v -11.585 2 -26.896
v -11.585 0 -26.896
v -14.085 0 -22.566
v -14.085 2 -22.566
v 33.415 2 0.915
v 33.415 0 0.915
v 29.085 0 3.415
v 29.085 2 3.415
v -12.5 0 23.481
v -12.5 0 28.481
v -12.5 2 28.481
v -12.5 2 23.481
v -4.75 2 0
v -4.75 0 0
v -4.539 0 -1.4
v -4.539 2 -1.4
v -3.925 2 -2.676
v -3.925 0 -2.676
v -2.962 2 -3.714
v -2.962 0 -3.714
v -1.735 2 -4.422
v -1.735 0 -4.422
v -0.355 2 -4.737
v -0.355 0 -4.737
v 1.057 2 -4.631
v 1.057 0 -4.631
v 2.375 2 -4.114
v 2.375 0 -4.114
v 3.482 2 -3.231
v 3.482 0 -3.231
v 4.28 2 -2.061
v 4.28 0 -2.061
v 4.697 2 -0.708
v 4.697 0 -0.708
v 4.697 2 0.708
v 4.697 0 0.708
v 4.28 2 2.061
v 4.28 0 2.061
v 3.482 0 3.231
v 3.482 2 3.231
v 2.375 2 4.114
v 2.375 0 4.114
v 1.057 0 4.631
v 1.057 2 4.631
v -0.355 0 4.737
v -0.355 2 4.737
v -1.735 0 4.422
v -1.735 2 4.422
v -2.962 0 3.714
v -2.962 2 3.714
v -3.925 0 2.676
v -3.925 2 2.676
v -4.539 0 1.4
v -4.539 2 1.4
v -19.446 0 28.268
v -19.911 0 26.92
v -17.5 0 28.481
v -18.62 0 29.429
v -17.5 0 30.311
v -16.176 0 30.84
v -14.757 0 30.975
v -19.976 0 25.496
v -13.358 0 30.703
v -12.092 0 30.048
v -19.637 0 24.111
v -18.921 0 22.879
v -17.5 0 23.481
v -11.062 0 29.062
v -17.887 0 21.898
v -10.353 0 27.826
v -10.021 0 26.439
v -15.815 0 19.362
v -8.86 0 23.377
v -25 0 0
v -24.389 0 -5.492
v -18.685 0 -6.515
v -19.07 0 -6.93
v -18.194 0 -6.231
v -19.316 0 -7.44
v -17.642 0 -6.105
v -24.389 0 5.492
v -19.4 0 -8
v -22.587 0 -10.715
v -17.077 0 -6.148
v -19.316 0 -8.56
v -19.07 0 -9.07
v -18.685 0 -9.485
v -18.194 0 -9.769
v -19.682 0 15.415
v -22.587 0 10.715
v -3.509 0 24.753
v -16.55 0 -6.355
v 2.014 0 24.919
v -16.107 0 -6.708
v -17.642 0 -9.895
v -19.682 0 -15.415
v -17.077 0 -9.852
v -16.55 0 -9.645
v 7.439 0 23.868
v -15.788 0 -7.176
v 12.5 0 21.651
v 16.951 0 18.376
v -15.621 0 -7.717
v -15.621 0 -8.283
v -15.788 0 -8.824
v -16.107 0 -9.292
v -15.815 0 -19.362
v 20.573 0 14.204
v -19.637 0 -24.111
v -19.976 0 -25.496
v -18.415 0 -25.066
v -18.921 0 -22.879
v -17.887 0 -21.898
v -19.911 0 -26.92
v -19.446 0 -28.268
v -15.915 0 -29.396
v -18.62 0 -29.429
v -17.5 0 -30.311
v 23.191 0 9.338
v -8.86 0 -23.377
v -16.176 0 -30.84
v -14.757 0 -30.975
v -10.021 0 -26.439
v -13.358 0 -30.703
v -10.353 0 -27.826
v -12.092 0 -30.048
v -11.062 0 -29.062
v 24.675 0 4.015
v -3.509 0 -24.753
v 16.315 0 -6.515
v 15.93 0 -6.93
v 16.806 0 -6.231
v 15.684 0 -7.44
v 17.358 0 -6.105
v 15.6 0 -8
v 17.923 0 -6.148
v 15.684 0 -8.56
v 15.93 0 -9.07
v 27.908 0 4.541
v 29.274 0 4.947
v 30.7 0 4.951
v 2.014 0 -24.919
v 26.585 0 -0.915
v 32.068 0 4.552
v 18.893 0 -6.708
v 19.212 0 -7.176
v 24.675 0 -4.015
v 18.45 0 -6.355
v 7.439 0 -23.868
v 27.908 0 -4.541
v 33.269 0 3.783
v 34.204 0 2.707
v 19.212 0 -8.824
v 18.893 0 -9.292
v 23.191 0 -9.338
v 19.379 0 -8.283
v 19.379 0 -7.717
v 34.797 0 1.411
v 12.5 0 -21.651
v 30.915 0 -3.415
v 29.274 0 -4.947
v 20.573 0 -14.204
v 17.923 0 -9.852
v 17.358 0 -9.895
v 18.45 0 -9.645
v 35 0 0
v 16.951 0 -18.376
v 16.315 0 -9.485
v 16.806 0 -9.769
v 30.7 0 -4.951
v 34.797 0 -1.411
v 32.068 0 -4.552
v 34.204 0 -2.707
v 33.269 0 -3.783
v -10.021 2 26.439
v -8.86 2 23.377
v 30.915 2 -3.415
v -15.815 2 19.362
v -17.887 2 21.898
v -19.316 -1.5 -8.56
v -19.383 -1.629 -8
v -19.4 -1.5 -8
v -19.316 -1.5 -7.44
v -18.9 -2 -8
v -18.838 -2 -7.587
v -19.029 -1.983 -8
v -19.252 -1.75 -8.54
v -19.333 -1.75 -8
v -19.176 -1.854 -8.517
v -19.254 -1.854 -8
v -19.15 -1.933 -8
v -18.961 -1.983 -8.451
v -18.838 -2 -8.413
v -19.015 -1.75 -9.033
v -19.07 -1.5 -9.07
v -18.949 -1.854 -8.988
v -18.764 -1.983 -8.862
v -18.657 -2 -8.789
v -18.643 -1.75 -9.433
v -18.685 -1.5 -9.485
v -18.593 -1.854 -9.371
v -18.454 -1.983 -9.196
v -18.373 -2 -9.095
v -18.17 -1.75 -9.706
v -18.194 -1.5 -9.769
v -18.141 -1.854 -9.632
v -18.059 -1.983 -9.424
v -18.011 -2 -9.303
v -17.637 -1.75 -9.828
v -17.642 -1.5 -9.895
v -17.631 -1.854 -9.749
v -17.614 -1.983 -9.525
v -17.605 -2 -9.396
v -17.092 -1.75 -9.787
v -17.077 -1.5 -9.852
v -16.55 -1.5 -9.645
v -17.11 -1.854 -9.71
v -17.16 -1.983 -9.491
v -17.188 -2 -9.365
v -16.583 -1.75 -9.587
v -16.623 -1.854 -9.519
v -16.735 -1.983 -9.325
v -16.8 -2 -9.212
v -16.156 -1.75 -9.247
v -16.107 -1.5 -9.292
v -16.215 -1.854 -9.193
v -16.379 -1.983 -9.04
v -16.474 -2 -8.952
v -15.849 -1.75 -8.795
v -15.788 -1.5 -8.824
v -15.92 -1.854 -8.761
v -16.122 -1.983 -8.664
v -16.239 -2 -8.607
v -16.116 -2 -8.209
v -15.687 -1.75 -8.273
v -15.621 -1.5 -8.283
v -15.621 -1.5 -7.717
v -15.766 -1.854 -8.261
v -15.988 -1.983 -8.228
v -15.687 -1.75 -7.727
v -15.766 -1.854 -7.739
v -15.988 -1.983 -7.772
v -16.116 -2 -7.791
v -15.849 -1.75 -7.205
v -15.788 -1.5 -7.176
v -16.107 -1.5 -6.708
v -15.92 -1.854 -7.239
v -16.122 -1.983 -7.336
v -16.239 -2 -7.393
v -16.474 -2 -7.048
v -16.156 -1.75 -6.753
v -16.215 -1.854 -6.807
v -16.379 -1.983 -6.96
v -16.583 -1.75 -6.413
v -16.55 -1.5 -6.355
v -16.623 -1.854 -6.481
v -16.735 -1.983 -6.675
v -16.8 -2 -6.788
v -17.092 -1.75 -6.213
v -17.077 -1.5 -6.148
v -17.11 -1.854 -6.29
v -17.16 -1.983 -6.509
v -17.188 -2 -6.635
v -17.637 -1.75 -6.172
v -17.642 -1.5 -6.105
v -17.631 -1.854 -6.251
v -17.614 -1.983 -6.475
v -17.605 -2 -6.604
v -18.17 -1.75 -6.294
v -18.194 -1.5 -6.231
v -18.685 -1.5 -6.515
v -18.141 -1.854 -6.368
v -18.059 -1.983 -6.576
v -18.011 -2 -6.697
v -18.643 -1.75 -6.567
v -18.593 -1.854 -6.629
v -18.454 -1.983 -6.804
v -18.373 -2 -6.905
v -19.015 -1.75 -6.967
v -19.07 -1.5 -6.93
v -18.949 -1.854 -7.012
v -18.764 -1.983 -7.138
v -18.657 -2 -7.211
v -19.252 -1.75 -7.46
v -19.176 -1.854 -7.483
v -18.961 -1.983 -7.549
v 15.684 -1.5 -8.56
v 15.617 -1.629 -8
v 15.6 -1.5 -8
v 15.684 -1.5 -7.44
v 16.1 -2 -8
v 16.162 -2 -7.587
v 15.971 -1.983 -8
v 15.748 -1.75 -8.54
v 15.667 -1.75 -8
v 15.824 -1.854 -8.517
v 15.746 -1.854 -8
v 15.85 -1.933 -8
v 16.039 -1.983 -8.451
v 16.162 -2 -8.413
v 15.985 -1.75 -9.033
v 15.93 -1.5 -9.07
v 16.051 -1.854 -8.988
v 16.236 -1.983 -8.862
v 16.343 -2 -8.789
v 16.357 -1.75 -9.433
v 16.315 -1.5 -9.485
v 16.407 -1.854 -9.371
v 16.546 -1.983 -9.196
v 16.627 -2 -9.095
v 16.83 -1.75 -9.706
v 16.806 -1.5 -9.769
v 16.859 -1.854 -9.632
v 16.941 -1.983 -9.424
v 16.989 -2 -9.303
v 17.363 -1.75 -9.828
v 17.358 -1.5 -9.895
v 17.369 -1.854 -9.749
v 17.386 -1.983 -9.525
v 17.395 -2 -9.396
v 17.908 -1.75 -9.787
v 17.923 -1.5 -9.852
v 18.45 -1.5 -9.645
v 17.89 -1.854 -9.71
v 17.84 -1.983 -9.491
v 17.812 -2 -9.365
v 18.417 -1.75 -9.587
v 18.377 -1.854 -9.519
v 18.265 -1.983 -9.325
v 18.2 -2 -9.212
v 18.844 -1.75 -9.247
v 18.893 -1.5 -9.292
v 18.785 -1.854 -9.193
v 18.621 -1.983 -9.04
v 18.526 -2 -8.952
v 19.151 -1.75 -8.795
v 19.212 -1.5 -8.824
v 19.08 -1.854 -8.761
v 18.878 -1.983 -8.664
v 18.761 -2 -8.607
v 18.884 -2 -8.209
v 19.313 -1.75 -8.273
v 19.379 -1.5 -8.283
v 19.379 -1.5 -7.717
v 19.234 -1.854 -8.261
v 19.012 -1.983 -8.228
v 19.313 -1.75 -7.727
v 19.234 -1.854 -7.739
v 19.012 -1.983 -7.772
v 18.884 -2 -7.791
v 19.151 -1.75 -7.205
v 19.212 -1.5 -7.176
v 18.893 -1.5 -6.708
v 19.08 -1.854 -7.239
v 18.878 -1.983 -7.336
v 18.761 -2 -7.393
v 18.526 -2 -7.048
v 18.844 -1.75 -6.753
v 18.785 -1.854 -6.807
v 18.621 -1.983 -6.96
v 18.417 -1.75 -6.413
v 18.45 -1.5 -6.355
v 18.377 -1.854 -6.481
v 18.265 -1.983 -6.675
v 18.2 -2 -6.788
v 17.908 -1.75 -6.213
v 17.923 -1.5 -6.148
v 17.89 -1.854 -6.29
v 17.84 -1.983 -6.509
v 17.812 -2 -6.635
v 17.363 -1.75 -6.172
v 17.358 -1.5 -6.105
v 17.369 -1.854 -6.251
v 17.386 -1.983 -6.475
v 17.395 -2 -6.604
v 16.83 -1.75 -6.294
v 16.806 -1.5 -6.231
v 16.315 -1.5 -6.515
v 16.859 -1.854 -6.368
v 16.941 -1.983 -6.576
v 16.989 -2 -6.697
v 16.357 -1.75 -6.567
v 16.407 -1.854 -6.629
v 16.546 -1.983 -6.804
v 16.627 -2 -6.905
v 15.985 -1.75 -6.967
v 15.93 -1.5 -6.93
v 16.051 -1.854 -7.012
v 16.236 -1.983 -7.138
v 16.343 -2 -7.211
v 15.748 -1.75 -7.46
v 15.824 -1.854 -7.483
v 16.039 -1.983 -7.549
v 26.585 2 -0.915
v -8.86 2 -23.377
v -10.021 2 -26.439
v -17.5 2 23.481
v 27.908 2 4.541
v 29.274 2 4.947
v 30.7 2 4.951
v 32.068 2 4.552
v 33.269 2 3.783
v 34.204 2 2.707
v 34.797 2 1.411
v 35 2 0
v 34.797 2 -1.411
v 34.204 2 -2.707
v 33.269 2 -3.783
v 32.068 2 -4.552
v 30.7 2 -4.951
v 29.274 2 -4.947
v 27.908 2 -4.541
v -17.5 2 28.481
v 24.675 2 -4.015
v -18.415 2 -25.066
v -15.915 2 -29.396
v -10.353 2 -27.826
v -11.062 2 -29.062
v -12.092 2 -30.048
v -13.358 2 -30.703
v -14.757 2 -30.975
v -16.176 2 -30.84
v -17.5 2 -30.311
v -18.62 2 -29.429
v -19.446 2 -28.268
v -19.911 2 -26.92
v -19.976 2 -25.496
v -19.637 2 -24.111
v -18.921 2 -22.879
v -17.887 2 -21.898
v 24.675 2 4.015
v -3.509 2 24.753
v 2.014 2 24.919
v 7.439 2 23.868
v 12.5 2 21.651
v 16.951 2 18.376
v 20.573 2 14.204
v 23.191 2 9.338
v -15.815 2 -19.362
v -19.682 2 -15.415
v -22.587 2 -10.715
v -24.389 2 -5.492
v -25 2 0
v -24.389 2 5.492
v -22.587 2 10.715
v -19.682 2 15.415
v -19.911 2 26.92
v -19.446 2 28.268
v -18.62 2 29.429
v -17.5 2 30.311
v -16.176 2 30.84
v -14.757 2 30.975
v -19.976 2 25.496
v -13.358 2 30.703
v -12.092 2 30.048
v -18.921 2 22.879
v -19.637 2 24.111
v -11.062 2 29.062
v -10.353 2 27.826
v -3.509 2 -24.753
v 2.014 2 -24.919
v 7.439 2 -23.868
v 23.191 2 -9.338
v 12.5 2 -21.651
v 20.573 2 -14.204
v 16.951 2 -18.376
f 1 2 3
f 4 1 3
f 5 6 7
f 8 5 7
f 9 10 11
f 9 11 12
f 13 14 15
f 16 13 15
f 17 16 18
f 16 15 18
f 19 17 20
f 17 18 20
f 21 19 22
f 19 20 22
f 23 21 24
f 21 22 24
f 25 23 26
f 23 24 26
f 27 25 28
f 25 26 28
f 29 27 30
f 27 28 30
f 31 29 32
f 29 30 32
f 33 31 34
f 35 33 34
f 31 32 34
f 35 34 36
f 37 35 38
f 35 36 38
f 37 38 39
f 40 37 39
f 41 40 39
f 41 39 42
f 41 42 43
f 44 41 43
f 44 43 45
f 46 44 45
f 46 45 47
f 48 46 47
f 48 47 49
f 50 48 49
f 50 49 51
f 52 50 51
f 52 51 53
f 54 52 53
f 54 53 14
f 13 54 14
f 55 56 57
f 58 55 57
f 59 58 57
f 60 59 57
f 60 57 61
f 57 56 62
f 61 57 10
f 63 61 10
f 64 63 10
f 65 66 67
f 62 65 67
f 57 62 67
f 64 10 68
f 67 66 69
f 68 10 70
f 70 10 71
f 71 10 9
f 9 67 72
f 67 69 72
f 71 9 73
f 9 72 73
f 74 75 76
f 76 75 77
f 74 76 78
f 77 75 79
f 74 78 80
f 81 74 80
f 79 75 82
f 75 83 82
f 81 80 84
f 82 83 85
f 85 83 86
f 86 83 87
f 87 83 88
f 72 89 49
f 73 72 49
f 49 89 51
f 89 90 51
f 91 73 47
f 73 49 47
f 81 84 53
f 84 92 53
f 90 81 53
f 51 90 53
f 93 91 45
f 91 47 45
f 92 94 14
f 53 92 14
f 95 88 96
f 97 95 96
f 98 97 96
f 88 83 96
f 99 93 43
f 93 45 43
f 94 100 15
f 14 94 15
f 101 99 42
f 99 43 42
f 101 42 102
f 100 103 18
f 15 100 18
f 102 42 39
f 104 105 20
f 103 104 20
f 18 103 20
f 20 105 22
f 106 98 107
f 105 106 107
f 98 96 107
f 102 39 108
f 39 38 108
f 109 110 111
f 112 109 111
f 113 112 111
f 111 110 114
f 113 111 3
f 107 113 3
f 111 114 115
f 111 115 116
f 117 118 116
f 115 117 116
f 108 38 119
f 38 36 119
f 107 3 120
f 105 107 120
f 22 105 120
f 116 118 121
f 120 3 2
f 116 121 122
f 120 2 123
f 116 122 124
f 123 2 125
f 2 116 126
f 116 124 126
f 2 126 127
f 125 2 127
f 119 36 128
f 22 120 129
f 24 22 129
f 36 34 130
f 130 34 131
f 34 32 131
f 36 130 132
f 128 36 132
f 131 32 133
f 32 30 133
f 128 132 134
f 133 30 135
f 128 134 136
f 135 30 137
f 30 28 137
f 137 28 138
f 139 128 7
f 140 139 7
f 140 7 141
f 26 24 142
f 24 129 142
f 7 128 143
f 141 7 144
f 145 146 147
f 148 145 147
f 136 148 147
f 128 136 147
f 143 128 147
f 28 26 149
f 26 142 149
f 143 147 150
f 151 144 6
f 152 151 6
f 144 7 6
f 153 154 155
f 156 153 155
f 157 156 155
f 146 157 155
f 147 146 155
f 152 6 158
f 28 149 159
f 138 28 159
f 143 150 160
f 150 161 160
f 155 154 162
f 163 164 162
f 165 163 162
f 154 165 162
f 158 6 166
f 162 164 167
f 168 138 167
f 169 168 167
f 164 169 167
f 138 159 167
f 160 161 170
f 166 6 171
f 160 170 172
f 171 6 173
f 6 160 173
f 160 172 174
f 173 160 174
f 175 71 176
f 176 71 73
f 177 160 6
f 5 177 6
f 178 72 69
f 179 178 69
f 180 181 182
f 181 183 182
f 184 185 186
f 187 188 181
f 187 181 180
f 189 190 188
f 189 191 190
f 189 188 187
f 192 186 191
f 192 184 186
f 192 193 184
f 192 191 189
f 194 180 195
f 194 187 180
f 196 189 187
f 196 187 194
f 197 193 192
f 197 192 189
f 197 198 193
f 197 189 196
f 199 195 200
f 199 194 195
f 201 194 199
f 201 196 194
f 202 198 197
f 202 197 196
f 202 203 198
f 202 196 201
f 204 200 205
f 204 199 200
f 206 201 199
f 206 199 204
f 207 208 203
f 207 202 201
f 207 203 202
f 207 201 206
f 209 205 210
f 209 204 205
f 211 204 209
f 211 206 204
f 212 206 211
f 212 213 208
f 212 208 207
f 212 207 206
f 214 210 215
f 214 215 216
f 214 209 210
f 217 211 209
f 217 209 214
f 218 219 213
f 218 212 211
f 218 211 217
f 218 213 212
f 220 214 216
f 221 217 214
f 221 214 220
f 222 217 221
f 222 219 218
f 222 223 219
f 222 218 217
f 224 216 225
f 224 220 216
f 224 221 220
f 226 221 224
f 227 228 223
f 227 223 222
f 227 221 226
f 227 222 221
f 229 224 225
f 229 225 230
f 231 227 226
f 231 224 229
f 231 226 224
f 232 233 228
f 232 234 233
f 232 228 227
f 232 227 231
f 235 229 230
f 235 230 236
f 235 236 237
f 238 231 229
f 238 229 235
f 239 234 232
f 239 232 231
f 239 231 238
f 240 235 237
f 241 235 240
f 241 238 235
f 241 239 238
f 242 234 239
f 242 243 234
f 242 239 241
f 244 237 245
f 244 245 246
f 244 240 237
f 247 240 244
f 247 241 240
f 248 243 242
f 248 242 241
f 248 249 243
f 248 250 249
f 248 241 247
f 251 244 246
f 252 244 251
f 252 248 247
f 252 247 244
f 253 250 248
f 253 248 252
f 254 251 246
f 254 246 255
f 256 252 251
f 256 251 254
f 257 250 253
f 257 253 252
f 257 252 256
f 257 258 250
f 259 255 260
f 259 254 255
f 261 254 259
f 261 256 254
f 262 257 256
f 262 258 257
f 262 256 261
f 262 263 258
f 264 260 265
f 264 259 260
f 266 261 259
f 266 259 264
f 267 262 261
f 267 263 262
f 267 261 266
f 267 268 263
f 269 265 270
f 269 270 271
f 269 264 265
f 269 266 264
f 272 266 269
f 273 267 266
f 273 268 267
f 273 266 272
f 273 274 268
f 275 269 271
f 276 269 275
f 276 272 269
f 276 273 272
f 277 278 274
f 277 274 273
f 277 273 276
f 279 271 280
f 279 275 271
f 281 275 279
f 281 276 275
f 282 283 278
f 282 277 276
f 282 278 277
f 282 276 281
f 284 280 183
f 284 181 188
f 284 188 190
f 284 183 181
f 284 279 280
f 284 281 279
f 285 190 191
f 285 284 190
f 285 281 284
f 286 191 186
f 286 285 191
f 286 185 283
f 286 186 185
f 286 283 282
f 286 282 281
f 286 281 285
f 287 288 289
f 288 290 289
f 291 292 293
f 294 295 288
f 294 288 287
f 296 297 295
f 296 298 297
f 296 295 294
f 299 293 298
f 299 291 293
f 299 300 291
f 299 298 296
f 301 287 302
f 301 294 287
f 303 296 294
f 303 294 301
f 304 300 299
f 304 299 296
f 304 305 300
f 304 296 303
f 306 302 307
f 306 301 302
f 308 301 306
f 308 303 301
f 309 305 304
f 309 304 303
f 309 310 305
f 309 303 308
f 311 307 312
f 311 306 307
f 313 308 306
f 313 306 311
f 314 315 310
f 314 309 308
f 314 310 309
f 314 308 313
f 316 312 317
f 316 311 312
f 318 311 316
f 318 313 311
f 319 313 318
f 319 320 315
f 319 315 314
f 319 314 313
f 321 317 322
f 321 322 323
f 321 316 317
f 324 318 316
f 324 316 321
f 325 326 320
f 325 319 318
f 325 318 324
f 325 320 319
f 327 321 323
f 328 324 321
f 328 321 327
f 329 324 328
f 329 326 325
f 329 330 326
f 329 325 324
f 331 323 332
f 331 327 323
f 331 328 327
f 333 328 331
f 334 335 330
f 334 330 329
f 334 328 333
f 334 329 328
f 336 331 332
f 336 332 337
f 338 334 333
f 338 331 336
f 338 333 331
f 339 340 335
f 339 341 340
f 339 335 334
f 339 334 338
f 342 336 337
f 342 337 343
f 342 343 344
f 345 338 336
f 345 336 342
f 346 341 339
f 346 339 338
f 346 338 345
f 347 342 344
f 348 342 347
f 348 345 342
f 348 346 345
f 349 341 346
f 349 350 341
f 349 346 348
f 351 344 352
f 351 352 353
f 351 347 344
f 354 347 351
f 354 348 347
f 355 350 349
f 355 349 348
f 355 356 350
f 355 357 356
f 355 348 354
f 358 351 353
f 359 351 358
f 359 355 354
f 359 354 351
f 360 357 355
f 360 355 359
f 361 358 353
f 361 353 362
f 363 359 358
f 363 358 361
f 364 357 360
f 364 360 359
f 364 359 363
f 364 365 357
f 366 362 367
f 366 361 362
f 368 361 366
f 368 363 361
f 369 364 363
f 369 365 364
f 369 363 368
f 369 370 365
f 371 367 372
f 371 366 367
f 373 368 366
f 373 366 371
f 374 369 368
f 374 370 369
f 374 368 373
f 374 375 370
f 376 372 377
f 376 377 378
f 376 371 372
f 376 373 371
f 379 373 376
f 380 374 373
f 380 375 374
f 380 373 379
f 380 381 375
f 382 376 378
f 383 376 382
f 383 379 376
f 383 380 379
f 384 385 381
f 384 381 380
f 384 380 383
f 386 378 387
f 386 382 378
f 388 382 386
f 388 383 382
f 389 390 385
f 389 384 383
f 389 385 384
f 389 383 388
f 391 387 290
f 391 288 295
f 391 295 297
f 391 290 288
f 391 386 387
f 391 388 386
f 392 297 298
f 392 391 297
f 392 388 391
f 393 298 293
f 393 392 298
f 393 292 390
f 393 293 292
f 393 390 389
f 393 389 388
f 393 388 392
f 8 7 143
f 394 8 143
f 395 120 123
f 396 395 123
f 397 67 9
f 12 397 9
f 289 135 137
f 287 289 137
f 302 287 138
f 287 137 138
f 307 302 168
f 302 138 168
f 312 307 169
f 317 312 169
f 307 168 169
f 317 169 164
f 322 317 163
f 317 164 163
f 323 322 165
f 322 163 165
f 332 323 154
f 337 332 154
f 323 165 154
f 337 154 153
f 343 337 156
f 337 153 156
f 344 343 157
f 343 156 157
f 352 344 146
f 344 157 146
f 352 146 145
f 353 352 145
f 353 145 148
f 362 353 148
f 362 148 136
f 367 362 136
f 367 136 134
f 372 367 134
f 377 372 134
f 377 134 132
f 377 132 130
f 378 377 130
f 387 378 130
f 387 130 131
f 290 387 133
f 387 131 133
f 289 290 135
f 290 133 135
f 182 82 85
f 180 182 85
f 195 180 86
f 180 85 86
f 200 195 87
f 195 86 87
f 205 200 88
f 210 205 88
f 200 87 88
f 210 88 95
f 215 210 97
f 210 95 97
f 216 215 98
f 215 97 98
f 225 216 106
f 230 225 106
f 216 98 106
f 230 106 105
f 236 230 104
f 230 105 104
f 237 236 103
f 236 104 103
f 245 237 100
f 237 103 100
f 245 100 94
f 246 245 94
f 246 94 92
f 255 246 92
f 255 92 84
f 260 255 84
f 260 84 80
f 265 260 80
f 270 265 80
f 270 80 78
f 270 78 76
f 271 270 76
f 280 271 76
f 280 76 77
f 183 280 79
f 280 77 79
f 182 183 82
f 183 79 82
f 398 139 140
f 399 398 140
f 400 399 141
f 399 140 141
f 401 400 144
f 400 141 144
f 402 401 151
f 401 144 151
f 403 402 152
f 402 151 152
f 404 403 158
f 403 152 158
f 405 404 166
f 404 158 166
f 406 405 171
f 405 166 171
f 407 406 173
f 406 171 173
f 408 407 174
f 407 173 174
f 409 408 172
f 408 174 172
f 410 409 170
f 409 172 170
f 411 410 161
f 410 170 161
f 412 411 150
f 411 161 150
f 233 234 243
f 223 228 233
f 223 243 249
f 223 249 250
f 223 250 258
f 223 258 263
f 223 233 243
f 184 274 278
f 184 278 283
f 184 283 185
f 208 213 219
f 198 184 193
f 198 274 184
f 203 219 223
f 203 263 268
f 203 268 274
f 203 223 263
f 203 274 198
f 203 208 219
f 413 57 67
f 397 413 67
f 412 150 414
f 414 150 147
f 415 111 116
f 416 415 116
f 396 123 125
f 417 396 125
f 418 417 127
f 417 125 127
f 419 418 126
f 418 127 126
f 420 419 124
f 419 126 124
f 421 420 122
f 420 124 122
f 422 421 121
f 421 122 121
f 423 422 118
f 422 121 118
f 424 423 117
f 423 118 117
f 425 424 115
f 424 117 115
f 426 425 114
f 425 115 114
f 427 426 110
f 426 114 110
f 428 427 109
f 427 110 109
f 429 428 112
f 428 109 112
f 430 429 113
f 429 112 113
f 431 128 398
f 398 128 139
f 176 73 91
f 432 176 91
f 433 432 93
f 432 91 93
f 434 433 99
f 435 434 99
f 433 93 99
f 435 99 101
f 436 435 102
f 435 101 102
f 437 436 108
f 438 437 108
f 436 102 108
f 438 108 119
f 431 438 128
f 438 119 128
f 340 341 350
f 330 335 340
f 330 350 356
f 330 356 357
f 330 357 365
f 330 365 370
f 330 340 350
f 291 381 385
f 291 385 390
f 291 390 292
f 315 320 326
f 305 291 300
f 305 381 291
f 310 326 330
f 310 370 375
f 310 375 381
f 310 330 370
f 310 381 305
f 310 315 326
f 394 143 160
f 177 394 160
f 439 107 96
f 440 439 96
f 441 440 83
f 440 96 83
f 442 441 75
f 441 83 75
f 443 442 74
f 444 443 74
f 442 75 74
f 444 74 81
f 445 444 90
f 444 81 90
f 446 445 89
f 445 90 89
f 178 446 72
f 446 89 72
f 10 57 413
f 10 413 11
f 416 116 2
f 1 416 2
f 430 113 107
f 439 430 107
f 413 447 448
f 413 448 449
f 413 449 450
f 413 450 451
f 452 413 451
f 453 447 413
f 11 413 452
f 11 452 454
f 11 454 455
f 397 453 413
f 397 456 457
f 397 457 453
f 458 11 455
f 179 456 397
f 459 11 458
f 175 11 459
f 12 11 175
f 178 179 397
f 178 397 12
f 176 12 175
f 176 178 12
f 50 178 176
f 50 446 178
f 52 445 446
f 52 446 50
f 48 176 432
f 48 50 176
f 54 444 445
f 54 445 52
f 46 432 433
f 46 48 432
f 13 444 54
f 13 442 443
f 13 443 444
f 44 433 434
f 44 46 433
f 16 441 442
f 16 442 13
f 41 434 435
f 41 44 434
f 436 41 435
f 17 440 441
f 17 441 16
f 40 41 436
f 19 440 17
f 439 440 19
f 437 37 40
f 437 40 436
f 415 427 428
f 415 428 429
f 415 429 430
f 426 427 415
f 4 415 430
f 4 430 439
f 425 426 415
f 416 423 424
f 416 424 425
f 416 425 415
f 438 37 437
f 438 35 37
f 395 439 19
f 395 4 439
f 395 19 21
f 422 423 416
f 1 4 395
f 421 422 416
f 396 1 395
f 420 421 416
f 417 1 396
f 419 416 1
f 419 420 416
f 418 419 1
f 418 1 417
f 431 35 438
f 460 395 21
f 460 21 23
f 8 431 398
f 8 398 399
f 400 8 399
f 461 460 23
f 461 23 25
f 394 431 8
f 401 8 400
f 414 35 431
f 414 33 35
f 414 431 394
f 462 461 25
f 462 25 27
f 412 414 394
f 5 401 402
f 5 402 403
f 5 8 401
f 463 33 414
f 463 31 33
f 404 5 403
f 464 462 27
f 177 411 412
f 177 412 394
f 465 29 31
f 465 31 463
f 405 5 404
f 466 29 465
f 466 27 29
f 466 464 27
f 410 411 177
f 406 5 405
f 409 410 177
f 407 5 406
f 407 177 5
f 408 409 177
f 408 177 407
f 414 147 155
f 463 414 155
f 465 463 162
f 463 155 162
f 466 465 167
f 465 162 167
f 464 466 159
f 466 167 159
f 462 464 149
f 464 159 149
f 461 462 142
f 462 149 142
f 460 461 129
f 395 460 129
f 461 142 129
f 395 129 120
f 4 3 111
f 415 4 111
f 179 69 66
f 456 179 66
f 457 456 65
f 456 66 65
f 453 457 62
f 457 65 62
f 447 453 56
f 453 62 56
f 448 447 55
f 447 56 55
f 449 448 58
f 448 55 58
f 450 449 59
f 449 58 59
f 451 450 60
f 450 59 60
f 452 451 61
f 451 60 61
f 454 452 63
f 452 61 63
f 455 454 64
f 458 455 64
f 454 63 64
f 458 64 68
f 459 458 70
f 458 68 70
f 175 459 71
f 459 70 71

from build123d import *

# Parameters (mm, degrees)
SKETCH1_W           = 5
SKETCH1_H           = 5
BOSS_EXTRUDE1_DEPTH = 2
CUT_EXTRUDE1_REACH  = 48.785
SKETCH2_R           = 4.75
SKETCH3_R           = 1.9
BOSS_EXTRUDE2_DEPTH = 2
FILLET1_R           = 0.5


with BuildPart() as part:
    # Sketch1 → Boss-Extrude1 (new body)
    with BuildSketch(Plane(origin=(0, 0, 0), x_dir=(1, 0, 0), z_dir=(0, 1, 0))):
        with BuildLine():
            ThreePointArc((-8.860443092, -23.377180074), (12.5, -21.650635095), (24.675453359, -4.01522123))
            Line((24.675453359, -4.01522123), (27.907701299, -4.541176736))
            ThreePointArc((27.907701299, -4.541176736), (35, 0), (27.907701299, 4.541176736))
            Line((27.907701299, 4.541176736), (24.675453359, 4.01522123))
            ThreePointArc((24.675453359, 4.01522123), (12.5, 21.650635095), (-8.860443092, 23.377180074))
            Line((-8.860443092, 23.377180074), (-10.021076233, 26.439366654))
            ThreePointArc((-10.021076233, 26.439366654), (-17.5, 30.310889132), (-17.886625066, 21.898189918))
            Line((-17.886625066, 21.898189918), (-15.815010267, 19.361958844))
            ThreePointArc((-15.815010267, 19.361958844), (-25, 0), (-15.815010267, -19.361958844))
            Line((-15.815010267, -19.361958844), (-17.886625066, -21.898189918))
            ThreePointArc((-17.886625066, -21.898189918), (-17.5, -30.310889132), (-10.021076233, -26.439366654))
            Line((-10.021076233, -26.439366654), (-8.860443092, -23.377180074))
        make_face()
        with Locations((-15, -25.980762114)):
            Rectangle(SKETCH1_W, SKETCH1_H, mode=Mode.SUBTRACT)
        Polygon((26.584936491, 0.915063509), (30.915063509, 3.415063509), (33.415063509, -0.915063509), (29.084936491, -3.415063509), align=None, mode=Mode.SUBTRACT)
        Polygon((-11.584936491, 26.895825623), (-14.084936491, 22.565698604), (-18.415063509, 25.065698604), (-15.915063509, 29.395825623), align=None, mode=Mode.SUBTRACT)
    extrude(amount=BOSS_EXTRUDE1_DEPTH)

    # Sketch2 → Cut-Extrude1 (cut, up to next)
    with BuildSketch(Plane(origin=(0, 0, 0), x_dir=(-1, 0, 0), z_dir=(0, -1, 0)), mode=Mode.PRIVATE) as cut_extrude1_sk1:
        Circle(SKETCH2_R)
    cut_extrude1_tool1 = extrude(cut_extrude1_sk1.sketch, amount=-CUT_EXTRUDE1_REACH, mode=Mode.PRIVATE) & part.part
    add(cut_extrude1_tool1.solids().sort_by_distance((0, 0, 0))[0], mode=Mode.SUBTRACT)

    # Sketch3 → Boss-Extrude2 (add)
    with BuildSketch(Plane(origin=(0, 0, 0), x_dir=(-1, 0, 0), z_dir=(0, -1, 0))):
        with Locations((17.5, 8)):
            Circle(SKETCH3_R)
        with Locations((-17.5, 8)):
            Circle(SKETCH3_R)
    extrude(amount=BOSS_EXTRUDE2_DEPTH)

    # Fillet1
    fillet1_edges = [part.edges().sort_by_distance(p)[0] for p in [
        (19.4, -2, -8),
        (-15.6, -2, -8),
    ]]
    fillet(fillet1_edges, radius=FILLET1_R)


solid = part.part
